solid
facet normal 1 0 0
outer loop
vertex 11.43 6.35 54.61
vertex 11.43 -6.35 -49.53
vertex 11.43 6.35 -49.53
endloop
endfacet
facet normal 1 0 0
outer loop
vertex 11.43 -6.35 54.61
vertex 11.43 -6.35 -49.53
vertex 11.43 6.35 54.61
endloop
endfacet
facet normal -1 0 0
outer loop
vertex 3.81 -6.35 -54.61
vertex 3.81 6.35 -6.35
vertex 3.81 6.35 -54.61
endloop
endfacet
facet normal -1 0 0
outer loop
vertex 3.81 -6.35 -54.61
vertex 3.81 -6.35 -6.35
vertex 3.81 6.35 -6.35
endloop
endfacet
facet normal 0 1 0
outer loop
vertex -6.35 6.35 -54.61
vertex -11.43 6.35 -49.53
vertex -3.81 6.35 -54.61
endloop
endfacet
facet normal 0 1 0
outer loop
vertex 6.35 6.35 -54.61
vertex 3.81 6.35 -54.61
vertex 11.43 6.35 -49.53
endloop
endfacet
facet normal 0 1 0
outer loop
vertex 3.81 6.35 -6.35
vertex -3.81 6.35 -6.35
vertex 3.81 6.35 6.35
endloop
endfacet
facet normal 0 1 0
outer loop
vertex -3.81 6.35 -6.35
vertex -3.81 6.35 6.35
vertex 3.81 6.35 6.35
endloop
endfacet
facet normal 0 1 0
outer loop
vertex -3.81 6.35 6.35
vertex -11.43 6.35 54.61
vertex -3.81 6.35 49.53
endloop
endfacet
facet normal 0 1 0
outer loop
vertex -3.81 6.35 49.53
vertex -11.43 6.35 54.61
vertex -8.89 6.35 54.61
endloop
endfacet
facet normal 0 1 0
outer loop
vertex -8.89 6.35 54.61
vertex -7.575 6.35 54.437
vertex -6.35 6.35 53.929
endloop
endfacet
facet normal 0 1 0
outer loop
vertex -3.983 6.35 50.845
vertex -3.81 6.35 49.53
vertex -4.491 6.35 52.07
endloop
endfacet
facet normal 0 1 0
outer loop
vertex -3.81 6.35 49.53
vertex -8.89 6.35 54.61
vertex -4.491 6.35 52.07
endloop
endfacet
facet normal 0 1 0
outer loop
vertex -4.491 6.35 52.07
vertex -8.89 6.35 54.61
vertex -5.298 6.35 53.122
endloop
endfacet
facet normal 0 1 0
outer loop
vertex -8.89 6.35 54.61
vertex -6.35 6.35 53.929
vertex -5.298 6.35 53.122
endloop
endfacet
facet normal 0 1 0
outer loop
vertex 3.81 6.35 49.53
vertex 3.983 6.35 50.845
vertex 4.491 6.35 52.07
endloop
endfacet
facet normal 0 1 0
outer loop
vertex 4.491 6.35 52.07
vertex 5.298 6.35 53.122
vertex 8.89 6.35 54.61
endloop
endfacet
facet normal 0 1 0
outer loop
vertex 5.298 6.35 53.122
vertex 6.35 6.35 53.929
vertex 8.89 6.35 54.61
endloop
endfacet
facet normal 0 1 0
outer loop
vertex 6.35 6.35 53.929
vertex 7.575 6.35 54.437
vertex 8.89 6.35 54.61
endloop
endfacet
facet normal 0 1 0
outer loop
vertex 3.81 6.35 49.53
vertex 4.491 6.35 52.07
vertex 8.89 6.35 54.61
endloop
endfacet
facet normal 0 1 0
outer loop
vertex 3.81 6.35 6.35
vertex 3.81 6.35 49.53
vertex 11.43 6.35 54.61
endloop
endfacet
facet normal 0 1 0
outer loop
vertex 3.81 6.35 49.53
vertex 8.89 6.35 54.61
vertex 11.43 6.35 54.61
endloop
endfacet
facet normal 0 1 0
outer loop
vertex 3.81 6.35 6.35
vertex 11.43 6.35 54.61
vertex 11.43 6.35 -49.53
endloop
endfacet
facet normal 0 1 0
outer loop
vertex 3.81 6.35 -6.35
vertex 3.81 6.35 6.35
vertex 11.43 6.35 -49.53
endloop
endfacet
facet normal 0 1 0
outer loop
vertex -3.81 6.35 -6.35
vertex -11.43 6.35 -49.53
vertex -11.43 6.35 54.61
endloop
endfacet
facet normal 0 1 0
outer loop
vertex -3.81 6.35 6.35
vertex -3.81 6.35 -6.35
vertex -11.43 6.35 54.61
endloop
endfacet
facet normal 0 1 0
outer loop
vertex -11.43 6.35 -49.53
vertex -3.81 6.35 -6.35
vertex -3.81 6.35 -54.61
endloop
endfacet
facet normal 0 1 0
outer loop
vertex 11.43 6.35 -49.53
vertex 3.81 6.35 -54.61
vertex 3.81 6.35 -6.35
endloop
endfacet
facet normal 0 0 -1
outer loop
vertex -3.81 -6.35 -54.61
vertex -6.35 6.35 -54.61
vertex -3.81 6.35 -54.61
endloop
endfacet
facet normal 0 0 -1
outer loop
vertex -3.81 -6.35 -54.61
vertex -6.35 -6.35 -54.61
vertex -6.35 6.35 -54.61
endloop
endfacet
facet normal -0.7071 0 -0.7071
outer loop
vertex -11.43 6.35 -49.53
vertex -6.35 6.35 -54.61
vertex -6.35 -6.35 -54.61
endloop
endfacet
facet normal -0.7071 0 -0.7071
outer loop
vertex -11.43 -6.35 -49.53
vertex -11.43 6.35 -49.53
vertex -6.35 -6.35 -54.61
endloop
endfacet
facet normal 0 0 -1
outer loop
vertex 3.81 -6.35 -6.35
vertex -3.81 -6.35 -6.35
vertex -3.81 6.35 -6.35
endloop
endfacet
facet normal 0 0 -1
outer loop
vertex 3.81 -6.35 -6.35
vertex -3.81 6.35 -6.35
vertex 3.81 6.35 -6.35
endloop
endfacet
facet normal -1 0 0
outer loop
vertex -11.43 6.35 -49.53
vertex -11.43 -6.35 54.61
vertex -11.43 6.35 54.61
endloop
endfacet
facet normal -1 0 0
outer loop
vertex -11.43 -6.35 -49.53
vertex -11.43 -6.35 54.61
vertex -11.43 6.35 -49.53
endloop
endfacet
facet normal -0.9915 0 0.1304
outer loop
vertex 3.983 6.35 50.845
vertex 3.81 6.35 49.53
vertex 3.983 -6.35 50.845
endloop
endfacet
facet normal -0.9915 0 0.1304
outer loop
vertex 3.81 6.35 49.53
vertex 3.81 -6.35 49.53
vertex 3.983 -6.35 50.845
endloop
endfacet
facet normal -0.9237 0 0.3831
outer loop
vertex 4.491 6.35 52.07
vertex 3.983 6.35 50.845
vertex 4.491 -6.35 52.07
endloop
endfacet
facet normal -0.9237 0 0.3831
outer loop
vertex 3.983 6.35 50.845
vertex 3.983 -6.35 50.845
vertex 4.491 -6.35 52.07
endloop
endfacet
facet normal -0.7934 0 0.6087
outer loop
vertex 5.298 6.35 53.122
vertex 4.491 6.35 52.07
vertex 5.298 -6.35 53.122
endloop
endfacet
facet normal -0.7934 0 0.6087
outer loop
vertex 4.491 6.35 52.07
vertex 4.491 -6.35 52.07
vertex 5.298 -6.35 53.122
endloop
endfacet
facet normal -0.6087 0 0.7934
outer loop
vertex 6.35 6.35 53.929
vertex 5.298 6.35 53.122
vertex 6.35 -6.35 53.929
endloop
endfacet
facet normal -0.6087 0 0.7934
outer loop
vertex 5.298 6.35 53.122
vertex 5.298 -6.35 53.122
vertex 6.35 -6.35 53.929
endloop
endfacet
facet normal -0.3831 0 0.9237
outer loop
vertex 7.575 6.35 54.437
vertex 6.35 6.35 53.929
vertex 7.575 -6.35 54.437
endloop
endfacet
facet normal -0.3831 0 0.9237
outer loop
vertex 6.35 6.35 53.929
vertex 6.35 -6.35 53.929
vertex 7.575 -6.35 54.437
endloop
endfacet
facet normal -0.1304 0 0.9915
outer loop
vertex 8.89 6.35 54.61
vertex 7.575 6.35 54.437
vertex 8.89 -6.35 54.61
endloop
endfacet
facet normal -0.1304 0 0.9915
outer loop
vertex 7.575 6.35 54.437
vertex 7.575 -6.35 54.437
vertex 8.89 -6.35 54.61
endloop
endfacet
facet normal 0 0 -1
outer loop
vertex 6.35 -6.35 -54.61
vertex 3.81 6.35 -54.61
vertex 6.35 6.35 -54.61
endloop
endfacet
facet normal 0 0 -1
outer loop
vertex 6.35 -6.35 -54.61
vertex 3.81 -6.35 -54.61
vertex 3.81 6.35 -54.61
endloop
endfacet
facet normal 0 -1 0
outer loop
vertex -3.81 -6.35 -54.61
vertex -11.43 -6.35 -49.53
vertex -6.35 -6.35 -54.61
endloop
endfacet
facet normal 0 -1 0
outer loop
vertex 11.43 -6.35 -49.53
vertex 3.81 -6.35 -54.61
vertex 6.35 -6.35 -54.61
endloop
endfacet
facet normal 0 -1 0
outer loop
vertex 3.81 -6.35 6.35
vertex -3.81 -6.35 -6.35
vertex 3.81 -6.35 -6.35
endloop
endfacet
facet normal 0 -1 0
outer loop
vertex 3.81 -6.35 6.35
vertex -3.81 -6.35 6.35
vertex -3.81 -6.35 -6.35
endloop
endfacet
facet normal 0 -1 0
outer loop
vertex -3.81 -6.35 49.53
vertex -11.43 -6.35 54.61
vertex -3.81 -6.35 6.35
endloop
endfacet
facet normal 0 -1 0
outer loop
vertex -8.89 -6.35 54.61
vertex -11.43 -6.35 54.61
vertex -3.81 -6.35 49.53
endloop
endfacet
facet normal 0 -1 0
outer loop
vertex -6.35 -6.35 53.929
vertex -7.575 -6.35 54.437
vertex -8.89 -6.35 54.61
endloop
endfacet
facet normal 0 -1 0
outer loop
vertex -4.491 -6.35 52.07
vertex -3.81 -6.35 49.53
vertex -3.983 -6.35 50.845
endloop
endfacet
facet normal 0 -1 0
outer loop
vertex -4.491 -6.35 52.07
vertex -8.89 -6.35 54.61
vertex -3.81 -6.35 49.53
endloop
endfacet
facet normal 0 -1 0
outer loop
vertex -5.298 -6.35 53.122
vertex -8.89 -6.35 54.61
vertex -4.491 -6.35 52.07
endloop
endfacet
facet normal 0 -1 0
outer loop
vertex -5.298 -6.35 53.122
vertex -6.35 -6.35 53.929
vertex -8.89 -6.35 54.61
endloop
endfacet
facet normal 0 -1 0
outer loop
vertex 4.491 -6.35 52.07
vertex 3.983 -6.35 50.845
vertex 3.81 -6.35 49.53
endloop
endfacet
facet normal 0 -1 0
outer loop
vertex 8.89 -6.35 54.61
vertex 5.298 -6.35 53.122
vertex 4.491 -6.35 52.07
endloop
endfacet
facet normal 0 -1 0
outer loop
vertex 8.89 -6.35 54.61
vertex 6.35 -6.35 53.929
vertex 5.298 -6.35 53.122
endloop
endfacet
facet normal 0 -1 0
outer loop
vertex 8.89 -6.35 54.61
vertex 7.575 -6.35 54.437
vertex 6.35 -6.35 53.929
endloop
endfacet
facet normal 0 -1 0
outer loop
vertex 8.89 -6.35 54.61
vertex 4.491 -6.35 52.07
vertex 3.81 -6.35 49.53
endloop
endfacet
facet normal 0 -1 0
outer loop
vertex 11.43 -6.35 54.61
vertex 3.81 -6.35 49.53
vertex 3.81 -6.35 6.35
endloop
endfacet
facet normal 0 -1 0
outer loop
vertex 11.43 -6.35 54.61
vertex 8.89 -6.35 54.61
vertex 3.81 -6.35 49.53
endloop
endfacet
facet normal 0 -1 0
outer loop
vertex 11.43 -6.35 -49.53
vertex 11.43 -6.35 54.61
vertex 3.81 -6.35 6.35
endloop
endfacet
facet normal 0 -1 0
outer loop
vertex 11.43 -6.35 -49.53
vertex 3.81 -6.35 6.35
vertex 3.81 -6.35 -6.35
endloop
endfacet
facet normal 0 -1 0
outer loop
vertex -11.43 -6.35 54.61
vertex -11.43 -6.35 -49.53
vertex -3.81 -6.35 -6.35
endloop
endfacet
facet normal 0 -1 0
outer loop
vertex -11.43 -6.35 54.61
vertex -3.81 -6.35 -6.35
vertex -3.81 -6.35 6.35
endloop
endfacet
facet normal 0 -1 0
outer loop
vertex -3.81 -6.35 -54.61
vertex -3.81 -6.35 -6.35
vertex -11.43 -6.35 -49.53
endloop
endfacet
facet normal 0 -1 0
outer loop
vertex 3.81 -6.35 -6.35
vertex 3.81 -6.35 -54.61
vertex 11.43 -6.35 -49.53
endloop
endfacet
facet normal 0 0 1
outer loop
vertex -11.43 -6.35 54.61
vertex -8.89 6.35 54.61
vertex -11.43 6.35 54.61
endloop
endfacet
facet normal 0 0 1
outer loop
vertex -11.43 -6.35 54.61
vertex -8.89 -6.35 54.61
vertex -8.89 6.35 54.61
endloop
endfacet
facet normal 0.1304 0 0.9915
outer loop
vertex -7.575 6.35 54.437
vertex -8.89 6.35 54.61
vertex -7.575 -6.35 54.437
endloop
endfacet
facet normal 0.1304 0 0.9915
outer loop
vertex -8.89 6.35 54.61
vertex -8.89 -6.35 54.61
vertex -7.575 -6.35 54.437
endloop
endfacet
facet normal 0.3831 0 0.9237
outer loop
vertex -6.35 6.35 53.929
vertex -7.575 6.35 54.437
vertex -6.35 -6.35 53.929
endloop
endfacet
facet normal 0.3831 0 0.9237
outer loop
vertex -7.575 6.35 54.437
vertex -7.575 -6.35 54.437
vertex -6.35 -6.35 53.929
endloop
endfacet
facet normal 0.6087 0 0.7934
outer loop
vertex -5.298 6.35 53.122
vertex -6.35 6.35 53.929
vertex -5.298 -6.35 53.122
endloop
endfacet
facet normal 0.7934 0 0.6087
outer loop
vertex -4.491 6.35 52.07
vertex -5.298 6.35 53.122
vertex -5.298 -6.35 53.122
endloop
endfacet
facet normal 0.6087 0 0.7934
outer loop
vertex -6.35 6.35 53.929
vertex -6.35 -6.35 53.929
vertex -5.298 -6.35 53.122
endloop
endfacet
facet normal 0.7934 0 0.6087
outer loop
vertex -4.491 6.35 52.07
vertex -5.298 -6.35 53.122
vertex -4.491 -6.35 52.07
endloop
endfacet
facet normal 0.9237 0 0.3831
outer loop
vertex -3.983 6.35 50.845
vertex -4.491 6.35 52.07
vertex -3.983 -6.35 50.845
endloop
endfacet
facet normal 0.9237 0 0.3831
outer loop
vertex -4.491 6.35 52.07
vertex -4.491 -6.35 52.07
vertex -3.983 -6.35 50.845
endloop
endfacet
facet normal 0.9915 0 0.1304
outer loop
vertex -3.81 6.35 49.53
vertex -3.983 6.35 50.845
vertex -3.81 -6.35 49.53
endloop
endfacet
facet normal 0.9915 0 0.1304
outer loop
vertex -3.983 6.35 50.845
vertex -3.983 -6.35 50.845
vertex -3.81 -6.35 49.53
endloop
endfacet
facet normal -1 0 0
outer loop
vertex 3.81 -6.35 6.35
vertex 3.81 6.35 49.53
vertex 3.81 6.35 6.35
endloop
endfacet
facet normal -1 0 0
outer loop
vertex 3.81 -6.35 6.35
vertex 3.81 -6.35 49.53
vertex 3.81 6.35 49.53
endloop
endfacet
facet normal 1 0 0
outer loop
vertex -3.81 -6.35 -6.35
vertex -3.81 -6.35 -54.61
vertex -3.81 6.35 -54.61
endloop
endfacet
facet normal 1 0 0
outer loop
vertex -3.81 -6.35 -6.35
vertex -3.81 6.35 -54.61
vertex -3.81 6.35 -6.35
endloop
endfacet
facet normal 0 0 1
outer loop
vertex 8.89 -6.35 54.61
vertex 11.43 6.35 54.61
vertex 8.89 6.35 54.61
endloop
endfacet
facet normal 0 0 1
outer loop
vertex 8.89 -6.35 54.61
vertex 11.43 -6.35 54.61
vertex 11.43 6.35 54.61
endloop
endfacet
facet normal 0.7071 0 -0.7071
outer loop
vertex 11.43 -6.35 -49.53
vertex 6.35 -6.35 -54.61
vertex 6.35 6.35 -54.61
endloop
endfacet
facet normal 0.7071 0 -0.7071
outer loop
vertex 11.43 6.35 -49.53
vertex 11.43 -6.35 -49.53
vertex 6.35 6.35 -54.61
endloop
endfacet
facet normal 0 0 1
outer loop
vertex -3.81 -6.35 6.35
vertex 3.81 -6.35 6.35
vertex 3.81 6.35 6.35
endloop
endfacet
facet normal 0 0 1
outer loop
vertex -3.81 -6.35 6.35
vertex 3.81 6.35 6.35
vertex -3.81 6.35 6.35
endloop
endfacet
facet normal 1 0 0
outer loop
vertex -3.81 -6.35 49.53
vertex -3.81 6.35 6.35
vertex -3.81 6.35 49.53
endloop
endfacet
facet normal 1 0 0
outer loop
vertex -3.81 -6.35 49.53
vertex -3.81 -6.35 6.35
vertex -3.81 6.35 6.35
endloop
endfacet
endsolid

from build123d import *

# Parameters (mm, degrees)
F1_DEPTH = 6.35
F2_R     = 5.08
F3_SIZE  = 5.08


with BuildPart() as f1:
    # F0 (on Front) → F1 (new body, symmetric)
    with BuildSketch(Plane.XZ):
        Polygon((11.43, -54.61), (11.43, 54.61), (3.81, 54.61), (3.81, 6.35), (-3.81, 6.35), (-3.81, 54.61), (-11.43, 54.61), (-11.43, -54.61), (-3.81, -54.61), (-3.81, -6.35), (3.81, -6.35), (3.81, -54.61), align=None)
    extrude(amount=F1_DEPTH, both=True)

    # F2
    f2_edges = [f1.edges().sort_by_distance(p)[0] for p in [
        (-3.81, 0, 54.61),
        (3.81, 0, 54.61),
    ]]
    fillet(f2_edges, radius=F2_R)

    # F3
    f3_edges = [f1.edges().sort_by_distance(p)[0] for p in [
        (-11.43, 0, -54.61),
        (11.43, 0, -54.61),
    ]]
    chamfer(f3_edges, length=F3_SIZE)


solid = f1.part
